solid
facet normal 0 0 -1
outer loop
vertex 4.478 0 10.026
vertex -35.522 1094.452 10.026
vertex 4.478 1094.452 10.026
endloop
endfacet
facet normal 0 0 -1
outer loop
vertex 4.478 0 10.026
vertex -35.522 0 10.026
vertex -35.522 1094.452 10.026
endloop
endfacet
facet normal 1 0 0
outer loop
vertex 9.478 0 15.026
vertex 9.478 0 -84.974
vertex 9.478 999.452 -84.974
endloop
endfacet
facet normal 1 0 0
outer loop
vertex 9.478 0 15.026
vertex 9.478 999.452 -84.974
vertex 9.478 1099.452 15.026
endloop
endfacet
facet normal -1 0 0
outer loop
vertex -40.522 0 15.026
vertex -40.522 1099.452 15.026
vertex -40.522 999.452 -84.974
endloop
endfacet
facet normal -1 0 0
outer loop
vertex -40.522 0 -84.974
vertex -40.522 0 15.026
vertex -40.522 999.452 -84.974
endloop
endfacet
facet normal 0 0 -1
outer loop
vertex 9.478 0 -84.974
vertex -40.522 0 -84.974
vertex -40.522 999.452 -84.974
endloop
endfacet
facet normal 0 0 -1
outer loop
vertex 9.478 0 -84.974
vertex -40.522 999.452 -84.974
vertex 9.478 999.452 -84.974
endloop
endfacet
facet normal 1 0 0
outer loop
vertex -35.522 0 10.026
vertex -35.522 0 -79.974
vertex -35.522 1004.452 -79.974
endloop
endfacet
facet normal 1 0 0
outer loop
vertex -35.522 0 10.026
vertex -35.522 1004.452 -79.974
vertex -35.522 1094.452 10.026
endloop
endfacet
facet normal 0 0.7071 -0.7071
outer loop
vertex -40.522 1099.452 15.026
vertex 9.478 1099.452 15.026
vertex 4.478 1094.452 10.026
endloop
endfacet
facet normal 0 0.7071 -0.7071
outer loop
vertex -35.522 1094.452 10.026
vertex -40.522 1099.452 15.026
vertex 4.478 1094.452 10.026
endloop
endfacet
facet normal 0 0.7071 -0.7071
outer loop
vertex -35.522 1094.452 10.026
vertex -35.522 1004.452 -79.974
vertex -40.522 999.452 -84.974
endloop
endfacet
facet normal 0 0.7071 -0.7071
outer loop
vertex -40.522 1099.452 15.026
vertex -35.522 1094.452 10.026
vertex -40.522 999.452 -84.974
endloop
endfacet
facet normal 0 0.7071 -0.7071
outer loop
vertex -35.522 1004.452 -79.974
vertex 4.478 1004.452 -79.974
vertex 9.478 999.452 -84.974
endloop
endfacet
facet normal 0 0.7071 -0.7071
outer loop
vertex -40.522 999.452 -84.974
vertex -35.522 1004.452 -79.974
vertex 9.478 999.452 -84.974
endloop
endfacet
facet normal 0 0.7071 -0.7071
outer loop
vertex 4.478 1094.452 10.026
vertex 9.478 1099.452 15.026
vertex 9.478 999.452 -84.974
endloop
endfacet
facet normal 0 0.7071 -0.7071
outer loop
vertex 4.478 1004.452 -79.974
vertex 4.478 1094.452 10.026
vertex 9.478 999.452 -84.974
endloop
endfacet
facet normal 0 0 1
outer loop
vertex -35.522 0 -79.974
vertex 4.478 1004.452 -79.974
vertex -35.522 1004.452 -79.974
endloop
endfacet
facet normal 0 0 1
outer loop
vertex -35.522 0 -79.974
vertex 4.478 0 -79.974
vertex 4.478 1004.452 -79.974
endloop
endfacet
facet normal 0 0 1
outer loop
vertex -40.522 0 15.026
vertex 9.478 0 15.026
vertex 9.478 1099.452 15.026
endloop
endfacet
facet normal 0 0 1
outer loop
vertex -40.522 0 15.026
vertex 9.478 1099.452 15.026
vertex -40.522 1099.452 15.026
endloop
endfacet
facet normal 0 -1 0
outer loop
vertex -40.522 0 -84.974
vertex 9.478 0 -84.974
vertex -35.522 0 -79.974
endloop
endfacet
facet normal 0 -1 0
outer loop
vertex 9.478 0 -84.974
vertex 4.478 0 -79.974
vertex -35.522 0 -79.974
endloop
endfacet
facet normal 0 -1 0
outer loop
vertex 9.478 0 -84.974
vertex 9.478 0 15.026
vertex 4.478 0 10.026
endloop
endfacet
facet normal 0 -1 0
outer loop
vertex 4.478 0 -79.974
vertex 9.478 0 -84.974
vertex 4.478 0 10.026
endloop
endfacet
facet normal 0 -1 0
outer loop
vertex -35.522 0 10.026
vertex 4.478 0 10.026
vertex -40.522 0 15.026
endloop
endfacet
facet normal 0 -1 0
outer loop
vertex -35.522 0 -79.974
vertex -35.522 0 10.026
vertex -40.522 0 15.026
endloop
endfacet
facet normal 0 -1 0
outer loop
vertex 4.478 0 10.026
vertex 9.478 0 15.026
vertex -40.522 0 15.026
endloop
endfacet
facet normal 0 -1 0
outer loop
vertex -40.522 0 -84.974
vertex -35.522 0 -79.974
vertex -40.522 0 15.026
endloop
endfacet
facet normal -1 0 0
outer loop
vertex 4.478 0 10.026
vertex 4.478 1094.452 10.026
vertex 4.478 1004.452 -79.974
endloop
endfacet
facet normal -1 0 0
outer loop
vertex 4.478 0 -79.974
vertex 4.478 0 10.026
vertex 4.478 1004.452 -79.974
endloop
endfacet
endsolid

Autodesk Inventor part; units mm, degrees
ref_plane "YZ Plane" through (0, 0, 0) normal (1, 0, 0) x (0, 1, 0)
ref_plane "XZ Plane" through (0, 0, 0) normal (0, 1, 0) x (-1, 0, 0)
ref_plane "XY Plane" through (0, 0, 0) normal (0, 0, 1) x (1, 0, 0)
sketch "Sketch1" plane through (0, 0, 0) normal (0, 1, 0) x (-1, 0, 0)
  line L0 (-9.4777, 15.0257) -> (40.5223, 15.0257)
  line L1 (40.5223, 15.0257) -> (40.5223, -84.9743)
  line L2 (40.5223, -84.9743) -> (-9.4777, -84.9743)
  line L3 (-9.4777, -84.9743) -> (-9.4777, 15.0257)
  line L4 (35.5223, 10.0257) -> (-4.4777, 10.0257)
  line L5 (-4.4777, 10.0257) -> (-4.4777, -79.9743)
  line L6 (-4.4777, -79.9743) -> (35.5223, -79.9743)
  line L7 (35.5223, -79.9743) -> (35.5223, 10.0257)
  point P0 (0, 0)
  point P1 (0, 0)
  dimension "d0" = 50
  dimension "d1" = 100
  dimension "d2" = 5
  dimension "d3" = 90
  dimension "d4" = 5
  dimension "d5" = 40
extrude "Extrusion1" add sketch "Sketch1" along normal blind 1100
sketch "Sketch2" plane through (9.4777, 0, 15.0257) normal (1, 0, 0) x (0, 0, -1)
  line L0 (-0.8068, 1100.2585) -> (100, 999.4516)
  line L1 (100, 0) -> (100, 1100) projected
  line L2 (-0.8068, 1100.2585) -> (141.7556, 1100.2585) construction
  line L3 (100, 999.4516) -> (100, 1100)
  line L4 (0, 0) -> (0, 1100) projected
  line L5 (100, 1100) -> (0, 1100)
  point P0 (15.0257, 0)
  point P1 (0, 1099.4516)
  dimension "d8" = 45
extrude "Extrusion2" cut sketch "Sketch2" against normal blind 1100
properties part number "PerfilV2"
